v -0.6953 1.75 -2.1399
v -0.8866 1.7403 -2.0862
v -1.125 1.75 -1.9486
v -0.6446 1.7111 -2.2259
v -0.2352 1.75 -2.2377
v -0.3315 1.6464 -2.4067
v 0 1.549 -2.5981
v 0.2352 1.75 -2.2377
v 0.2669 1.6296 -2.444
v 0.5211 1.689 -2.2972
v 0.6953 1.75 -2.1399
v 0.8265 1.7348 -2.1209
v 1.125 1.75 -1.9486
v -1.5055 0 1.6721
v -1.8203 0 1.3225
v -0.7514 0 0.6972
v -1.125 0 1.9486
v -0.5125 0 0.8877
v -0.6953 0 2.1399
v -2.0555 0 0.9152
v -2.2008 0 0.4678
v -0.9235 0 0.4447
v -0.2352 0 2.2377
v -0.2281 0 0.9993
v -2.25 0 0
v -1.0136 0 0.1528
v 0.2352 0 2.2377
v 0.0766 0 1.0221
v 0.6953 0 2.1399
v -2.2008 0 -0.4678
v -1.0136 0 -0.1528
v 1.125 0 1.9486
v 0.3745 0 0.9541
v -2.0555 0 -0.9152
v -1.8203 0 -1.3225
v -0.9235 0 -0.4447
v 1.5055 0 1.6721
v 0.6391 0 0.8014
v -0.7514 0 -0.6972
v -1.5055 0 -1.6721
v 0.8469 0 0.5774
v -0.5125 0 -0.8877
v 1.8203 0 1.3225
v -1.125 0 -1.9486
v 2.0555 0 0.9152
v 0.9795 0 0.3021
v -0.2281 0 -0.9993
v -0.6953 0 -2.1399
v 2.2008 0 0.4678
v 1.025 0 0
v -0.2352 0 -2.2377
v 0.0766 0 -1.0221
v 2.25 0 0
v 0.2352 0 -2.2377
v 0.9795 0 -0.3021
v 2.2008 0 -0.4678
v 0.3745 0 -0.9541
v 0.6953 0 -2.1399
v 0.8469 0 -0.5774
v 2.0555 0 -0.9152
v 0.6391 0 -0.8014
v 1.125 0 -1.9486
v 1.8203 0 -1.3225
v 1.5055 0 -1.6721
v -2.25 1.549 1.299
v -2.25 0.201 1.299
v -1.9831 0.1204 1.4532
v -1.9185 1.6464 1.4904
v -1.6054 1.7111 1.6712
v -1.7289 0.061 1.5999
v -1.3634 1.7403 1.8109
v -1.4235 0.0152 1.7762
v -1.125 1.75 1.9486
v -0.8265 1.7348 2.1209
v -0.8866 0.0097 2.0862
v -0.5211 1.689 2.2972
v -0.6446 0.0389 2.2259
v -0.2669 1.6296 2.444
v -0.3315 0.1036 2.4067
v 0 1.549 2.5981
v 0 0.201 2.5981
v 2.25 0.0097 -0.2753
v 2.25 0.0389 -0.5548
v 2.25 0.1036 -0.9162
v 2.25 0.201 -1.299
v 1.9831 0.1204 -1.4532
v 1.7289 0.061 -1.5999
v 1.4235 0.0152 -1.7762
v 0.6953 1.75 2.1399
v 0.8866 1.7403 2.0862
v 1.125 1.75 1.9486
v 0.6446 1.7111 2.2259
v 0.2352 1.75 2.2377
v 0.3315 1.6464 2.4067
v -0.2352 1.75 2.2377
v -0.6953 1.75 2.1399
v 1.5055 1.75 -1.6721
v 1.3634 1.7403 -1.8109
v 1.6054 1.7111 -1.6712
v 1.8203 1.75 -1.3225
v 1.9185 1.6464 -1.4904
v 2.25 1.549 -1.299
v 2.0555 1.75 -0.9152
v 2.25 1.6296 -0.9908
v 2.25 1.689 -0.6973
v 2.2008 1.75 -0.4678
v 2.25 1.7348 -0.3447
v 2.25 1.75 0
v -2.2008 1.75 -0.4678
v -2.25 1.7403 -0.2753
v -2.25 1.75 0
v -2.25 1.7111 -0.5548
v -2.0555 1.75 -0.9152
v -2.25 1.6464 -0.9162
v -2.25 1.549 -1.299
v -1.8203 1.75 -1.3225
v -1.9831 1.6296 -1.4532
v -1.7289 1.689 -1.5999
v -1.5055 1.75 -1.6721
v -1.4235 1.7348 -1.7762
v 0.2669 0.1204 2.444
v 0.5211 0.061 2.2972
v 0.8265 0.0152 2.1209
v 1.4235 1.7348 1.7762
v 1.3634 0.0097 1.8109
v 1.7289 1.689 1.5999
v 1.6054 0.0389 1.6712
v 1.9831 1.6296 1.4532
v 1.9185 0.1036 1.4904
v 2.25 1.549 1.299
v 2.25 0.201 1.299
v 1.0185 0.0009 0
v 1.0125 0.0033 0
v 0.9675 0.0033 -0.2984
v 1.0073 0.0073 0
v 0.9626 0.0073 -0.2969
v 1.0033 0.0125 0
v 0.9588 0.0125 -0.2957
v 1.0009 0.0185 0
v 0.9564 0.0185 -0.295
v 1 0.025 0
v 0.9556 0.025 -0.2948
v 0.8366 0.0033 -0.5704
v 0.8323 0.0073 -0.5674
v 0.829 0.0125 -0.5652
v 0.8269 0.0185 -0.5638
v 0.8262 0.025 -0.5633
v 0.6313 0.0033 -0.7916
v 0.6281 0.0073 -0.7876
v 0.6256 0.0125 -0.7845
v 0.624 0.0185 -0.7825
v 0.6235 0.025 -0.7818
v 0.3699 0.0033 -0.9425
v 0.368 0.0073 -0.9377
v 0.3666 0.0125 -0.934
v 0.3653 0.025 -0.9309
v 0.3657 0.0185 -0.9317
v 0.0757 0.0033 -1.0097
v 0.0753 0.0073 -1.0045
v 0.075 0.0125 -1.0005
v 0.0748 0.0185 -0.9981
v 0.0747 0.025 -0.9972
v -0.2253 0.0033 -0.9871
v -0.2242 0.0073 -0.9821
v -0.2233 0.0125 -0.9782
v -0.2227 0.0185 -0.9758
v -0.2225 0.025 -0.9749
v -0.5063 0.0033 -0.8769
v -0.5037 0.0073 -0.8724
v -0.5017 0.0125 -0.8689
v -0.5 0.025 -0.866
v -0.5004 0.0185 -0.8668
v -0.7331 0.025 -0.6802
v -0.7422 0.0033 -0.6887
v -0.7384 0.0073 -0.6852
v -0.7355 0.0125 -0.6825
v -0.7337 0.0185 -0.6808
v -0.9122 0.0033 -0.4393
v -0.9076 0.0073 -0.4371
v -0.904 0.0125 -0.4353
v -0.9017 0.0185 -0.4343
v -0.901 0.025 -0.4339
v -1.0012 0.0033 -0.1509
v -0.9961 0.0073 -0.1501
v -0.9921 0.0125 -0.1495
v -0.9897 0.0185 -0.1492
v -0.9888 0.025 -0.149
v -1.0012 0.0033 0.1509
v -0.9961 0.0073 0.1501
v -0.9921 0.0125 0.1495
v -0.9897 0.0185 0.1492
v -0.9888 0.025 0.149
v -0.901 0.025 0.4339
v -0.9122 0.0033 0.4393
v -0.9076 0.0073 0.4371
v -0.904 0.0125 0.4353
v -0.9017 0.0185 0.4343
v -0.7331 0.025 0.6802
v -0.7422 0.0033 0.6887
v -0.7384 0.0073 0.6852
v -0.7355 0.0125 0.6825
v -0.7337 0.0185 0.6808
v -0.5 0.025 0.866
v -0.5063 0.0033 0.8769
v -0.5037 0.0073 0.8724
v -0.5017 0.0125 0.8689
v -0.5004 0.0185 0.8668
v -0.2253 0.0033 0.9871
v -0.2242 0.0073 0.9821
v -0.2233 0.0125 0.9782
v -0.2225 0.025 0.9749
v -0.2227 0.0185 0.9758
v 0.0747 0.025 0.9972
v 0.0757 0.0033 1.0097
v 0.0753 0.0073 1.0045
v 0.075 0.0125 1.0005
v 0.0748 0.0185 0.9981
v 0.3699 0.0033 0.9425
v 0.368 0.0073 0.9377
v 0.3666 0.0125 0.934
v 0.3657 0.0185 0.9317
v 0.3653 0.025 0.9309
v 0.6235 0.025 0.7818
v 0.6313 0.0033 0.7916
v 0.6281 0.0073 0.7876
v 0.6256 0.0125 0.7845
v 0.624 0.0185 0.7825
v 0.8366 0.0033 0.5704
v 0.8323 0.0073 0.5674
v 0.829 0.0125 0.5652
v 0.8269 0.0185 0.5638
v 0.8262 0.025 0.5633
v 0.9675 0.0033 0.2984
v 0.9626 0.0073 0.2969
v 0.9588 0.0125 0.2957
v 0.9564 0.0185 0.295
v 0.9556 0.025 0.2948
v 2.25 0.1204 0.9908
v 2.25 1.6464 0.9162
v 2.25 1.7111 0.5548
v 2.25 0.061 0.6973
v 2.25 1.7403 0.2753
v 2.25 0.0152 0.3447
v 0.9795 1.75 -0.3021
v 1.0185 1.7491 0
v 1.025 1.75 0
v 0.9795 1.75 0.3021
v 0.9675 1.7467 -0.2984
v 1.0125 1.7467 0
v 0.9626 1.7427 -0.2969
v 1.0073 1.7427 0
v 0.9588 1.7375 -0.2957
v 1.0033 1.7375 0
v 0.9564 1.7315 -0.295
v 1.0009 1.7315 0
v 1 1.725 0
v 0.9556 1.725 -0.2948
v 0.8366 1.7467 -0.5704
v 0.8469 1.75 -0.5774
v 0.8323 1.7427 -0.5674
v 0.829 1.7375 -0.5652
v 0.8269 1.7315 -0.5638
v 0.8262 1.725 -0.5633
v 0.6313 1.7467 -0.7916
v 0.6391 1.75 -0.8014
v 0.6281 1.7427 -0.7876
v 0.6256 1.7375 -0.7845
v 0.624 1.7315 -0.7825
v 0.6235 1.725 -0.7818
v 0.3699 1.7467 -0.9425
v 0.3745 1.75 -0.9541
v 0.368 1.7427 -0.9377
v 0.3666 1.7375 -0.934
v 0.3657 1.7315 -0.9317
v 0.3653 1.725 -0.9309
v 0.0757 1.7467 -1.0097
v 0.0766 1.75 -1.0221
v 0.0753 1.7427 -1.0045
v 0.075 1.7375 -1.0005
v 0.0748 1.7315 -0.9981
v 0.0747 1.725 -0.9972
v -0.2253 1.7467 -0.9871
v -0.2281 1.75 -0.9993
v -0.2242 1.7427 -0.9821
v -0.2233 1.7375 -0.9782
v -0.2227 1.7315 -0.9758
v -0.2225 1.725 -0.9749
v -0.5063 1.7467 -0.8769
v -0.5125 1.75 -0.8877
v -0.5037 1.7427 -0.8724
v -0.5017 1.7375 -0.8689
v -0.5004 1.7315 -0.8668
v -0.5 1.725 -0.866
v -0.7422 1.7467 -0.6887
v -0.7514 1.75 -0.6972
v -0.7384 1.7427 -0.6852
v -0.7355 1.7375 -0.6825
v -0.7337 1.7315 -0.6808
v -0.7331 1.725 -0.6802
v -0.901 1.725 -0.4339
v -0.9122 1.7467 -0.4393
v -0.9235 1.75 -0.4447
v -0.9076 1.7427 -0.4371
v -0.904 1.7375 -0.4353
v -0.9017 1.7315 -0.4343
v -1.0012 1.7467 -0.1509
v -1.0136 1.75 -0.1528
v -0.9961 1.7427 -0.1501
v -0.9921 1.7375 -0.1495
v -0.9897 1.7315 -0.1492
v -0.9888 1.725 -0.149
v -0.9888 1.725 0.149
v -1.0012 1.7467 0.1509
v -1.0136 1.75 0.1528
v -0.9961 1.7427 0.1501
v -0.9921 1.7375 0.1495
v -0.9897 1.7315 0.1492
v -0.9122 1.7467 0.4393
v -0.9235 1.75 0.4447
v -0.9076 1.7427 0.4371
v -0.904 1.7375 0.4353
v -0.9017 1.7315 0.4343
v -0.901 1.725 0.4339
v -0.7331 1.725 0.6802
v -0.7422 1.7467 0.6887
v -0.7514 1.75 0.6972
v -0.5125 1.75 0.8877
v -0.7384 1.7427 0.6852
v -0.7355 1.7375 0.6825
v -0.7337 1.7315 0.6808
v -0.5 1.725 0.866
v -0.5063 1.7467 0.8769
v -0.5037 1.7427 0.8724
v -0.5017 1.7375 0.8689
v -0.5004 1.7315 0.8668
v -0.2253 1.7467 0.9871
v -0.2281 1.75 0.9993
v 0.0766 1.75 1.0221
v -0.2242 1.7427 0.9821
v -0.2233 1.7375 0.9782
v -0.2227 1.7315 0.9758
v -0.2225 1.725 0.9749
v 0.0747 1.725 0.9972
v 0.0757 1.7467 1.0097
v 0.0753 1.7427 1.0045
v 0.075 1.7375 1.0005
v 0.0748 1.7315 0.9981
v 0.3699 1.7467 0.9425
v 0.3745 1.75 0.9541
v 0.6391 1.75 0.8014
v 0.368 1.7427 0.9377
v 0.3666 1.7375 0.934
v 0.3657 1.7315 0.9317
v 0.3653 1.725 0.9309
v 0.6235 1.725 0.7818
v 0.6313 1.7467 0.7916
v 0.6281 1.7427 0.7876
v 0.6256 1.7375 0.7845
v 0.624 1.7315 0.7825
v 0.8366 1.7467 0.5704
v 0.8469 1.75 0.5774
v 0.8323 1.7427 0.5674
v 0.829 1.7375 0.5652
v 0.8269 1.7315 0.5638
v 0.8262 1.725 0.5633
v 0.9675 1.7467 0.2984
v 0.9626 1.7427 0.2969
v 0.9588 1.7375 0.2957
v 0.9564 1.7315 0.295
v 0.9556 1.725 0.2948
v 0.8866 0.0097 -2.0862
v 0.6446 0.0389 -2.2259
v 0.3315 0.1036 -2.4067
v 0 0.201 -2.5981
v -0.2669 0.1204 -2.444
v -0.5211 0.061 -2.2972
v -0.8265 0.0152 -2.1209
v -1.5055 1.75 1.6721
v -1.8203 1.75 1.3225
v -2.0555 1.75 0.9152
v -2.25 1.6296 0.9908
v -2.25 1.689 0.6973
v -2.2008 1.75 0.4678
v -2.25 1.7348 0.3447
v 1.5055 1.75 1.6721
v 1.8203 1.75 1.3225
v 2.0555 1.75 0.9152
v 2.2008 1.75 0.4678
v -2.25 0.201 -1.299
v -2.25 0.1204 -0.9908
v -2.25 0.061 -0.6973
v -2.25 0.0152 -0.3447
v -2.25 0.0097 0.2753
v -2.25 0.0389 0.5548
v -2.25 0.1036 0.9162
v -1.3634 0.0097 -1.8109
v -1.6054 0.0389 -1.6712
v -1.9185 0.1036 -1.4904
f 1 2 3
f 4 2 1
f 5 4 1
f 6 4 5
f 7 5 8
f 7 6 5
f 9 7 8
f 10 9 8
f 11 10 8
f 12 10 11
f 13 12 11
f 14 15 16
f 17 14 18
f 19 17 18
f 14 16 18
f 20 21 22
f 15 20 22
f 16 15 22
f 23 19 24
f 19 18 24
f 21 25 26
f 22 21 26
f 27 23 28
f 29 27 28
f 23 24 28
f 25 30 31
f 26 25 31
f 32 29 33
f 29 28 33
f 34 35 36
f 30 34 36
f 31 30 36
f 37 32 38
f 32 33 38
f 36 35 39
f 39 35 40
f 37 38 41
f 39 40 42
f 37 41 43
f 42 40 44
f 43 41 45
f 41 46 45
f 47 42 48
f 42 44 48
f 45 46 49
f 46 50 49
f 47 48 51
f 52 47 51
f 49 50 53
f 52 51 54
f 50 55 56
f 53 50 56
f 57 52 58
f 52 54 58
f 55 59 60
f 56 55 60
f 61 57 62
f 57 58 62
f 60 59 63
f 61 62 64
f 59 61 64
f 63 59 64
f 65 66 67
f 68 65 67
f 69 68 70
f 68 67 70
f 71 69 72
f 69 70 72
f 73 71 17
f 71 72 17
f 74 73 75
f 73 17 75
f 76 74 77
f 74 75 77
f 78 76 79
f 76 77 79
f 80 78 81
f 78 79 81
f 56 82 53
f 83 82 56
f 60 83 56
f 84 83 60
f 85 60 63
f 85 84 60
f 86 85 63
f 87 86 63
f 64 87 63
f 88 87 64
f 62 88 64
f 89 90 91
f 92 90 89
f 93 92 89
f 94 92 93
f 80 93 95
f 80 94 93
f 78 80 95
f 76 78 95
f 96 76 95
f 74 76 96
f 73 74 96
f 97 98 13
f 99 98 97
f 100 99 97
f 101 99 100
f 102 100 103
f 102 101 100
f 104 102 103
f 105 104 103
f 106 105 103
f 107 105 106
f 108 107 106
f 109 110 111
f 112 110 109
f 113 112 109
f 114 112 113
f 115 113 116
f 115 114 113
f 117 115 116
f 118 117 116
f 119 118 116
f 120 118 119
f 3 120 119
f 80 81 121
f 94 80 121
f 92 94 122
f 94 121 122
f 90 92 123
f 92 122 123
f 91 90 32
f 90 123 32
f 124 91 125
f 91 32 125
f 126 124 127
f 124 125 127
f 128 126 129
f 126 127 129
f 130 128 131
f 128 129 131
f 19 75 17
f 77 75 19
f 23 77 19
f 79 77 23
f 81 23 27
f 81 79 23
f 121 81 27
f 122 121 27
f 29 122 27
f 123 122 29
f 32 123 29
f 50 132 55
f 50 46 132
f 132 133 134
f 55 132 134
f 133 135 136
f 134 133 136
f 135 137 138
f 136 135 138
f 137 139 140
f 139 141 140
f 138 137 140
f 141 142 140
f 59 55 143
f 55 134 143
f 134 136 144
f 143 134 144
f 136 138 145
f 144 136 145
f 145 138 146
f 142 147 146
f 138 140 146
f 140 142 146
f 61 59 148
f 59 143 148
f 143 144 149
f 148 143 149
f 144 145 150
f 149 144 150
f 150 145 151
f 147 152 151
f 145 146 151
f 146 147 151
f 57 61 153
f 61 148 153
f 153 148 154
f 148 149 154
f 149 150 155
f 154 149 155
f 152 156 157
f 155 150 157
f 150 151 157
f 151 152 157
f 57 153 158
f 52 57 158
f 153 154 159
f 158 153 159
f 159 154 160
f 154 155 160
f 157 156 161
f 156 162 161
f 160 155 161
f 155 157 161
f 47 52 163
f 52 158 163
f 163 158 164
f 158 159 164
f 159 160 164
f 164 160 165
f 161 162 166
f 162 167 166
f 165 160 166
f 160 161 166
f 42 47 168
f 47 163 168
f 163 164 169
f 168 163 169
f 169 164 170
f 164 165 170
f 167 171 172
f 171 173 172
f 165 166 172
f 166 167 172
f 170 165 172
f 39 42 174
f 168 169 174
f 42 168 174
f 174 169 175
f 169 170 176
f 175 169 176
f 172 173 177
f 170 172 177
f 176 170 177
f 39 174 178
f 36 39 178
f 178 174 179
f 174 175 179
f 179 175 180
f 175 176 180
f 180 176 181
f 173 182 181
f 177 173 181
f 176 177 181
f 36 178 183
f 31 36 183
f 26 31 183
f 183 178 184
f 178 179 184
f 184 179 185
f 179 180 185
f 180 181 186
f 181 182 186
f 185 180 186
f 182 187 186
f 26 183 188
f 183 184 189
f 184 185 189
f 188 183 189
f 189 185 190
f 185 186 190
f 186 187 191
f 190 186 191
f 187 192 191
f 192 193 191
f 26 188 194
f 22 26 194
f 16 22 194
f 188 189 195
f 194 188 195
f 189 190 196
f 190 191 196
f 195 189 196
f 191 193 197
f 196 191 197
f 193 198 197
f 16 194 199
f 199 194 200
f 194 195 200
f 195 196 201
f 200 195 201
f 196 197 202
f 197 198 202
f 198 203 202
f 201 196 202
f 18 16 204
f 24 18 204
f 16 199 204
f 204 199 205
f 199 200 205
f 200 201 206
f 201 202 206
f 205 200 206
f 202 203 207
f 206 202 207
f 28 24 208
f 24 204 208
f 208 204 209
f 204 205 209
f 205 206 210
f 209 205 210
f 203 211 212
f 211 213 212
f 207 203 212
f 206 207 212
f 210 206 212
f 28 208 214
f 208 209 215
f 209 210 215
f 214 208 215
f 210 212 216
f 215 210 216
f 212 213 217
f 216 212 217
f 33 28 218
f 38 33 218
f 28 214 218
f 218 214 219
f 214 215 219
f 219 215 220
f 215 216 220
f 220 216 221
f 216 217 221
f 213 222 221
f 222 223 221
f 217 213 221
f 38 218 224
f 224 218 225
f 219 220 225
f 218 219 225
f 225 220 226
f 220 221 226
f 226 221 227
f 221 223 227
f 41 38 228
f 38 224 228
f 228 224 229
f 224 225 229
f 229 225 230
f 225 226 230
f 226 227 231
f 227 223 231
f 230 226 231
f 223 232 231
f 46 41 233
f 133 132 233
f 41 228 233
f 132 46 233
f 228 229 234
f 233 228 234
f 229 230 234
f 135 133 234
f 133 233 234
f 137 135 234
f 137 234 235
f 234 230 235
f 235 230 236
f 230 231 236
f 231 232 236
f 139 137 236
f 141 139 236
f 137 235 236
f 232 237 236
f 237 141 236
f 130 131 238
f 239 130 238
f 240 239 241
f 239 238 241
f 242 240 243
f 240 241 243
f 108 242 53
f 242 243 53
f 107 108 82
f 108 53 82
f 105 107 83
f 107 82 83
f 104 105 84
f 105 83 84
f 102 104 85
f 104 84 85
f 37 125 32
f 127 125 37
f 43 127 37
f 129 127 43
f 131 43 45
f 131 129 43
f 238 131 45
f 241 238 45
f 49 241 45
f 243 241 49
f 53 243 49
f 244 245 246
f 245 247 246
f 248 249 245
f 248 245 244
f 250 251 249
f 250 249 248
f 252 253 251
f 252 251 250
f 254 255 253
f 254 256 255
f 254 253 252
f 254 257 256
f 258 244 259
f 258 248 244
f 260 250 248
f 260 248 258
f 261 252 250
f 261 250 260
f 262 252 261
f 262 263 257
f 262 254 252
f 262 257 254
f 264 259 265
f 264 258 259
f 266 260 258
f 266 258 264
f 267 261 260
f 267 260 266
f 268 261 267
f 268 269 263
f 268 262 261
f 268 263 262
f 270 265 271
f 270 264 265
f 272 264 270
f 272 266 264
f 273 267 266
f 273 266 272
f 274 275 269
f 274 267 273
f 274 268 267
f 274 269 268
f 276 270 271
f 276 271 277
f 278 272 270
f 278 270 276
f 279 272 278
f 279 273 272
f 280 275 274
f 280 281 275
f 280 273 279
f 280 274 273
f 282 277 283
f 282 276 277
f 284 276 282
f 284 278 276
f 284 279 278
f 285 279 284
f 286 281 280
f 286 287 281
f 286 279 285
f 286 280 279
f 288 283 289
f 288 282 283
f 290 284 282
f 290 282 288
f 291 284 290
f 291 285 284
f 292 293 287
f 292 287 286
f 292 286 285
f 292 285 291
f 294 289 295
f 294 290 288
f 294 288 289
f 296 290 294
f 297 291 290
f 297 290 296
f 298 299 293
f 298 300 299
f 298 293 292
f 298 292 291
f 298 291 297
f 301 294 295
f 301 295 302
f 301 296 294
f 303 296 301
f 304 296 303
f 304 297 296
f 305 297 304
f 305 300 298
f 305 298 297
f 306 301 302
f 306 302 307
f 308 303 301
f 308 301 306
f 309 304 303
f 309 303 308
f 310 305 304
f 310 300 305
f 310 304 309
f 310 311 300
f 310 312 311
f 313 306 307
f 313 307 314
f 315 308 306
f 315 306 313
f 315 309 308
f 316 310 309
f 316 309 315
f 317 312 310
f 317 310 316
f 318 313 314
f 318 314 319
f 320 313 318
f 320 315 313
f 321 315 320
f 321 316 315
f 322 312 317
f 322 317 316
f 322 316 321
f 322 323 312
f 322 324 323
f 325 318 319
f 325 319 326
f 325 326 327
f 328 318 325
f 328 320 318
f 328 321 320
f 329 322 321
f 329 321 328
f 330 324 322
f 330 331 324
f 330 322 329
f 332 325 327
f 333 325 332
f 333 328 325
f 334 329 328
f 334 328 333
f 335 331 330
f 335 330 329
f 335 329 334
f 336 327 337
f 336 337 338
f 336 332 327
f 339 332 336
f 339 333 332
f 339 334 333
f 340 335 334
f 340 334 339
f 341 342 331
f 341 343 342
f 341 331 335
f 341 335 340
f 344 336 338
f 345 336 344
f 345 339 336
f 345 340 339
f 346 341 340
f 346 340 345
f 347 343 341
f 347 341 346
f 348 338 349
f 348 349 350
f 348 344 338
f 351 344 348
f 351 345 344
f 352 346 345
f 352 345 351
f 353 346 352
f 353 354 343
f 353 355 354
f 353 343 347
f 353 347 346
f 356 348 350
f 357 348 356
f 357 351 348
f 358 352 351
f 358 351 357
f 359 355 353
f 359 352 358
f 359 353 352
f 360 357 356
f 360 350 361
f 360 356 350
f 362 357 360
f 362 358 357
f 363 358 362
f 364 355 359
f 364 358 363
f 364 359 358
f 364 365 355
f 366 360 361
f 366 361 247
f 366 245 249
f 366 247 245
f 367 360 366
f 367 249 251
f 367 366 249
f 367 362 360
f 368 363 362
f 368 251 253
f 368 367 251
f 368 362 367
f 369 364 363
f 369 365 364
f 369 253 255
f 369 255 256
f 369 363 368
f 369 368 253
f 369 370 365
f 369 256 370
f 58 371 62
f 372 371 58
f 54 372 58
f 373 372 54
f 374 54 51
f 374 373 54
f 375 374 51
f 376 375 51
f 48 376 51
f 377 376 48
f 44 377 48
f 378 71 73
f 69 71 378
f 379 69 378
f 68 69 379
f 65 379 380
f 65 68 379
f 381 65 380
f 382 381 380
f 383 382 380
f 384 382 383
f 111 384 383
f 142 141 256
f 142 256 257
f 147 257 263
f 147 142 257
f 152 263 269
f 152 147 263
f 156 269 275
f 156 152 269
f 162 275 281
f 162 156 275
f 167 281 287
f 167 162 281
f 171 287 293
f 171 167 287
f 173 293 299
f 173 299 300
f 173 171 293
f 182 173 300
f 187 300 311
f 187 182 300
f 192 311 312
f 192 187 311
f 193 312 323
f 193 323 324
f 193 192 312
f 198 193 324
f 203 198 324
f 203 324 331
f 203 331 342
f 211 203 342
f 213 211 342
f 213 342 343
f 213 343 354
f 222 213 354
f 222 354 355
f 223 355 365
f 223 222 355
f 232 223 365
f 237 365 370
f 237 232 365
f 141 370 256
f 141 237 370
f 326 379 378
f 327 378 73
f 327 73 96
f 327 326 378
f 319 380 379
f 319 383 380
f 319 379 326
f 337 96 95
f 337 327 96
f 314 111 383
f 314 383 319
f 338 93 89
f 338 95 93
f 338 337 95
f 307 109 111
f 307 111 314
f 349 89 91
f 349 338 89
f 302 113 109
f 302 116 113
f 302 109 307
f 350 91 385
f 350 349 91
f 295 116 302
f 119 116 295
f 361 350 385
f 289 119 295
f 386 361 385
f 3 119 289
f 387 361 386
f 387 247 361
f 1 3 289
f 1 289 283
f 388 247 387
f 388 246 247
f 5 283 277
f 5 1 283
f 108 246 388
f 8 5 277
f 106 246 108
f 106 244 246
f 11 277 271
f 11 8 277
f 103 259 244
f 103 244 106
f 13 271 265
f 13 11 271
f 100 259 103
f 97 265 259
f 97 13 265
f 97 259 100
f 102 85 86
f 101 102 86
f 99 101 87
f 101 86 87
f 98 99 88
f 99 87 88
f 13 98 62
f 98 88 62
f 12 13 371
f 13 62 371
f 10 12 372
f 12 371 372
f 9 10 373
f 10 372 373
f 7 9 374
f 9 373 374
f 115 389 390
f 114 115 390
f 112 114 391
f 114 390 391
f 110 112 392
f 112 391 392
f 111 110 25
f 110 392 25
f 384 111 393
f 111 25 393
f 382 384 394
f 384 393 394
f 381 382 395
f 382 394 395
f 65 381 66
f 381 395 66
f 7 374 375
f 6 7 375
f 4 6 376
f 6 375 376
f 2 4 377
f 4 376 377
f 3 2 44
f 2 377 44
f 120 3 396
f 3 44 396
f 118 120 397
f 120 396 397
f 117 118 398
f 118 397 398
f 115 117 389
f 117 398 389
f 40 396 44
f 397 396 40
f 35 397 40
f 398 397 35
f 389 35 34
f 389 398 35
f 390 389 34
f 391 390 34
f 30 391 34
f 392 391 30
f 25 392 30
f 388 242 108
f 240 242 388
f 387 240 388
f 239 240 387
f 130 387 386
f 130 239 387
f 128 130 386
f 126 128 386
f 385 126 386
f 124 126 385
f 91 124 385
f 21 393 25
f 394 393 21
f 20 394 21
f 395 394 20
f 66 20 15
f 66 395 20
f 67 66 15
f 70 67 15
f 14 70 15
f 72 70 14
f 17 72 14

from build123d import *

# Parameters (mm, degrees)
SKETCH1_R           = 1
BOSS_EXTRUDE1_DEPTH = 1.75
SKETCH2_OUTSIDE_W   = 13.98
SKETCH2_OUTSIDE_H   = 14.676
SKETCH2_OUTSIDE_R   = 2.25
CUT_EXTRUDE1_DEPTH  = 1.75
CUT_EXTRUDE1_TAPER  = 60
SKETCH3_OUTSIDE_W   = 13.98
SKETCH3_OUTSIDE_H   = 14.676
SKETCH3_OUTSIDE_R   = 2.25
CUT_EXTRUDE3_DEPTH  = 1.75
CUT_EXTRUDE3_TAPER  = 60
FILLET1_R           = 0.025


with BuildPart() as part:
    # Sketch1 → Boss-Extrude1 (new body)
    with BuildSketch(Plane(origin=(0, 0, 0), x_dir=(1, 0, 0), z_dir=(0, 1, 0))):
        Polygon((2.25, -1.299038106), (2.25, 1.299038106), (0, 2.598076211), (-2.25, 1.299038106), (-2.25, -1.299038106), (0, -2.598076211), align=None)
        Circle(SKETCH1_R, mode=Mode.SUBTRACT)
    extrude(amount=BOSS_EXTRUDE1_DEPTH)

    # Sketch2 outside → Cut-Extrude1 (cut)
    with BuildSketch(Plane(origin=(0, 1.75, 0), x_dir=(1, 0, 0), z_dir=(0, 1, 0))):
        Rectangle(SKETCH2_OUTSIDE_W, SKETCH2_OUTSIDE_H)
        Circle(SKETCH2_OUTSIDE_R, mode=Mode.SUBTRACT)
    extrude(amount=-CUT_EXTRUDE1_DEPTH, taper=CUT_EXTRUDE1_TAPER, mode=Mode.SUBTRACT)

    # Sketch3 outside → Cut-Extrude3 (cut)
    with BuildSketch(Plane.XZ):
        Rectangle(SKETCH3_OUTSIDE_W, SKETCH3_OUTSIDE_H)
        Circle(SKETCH3_OUTSIDE_R, mode=Mode.SUBTRACT)
    extrude(amount=-CUT_EXTRUDE3_DEPTH, taper=CUT_EXTRUDE3_TAPER, mode=Mode.SUBTRACT)

    # Fillet1
    fillet1_edges = [part.edges().sort_by_distance(p)[0] for p in [
        (-1, 0, 0),
        (-1, 1.75, 0),
    ]]
    fillet(fillet1_edges, radius=FILLET1_R)


solid = part.part
